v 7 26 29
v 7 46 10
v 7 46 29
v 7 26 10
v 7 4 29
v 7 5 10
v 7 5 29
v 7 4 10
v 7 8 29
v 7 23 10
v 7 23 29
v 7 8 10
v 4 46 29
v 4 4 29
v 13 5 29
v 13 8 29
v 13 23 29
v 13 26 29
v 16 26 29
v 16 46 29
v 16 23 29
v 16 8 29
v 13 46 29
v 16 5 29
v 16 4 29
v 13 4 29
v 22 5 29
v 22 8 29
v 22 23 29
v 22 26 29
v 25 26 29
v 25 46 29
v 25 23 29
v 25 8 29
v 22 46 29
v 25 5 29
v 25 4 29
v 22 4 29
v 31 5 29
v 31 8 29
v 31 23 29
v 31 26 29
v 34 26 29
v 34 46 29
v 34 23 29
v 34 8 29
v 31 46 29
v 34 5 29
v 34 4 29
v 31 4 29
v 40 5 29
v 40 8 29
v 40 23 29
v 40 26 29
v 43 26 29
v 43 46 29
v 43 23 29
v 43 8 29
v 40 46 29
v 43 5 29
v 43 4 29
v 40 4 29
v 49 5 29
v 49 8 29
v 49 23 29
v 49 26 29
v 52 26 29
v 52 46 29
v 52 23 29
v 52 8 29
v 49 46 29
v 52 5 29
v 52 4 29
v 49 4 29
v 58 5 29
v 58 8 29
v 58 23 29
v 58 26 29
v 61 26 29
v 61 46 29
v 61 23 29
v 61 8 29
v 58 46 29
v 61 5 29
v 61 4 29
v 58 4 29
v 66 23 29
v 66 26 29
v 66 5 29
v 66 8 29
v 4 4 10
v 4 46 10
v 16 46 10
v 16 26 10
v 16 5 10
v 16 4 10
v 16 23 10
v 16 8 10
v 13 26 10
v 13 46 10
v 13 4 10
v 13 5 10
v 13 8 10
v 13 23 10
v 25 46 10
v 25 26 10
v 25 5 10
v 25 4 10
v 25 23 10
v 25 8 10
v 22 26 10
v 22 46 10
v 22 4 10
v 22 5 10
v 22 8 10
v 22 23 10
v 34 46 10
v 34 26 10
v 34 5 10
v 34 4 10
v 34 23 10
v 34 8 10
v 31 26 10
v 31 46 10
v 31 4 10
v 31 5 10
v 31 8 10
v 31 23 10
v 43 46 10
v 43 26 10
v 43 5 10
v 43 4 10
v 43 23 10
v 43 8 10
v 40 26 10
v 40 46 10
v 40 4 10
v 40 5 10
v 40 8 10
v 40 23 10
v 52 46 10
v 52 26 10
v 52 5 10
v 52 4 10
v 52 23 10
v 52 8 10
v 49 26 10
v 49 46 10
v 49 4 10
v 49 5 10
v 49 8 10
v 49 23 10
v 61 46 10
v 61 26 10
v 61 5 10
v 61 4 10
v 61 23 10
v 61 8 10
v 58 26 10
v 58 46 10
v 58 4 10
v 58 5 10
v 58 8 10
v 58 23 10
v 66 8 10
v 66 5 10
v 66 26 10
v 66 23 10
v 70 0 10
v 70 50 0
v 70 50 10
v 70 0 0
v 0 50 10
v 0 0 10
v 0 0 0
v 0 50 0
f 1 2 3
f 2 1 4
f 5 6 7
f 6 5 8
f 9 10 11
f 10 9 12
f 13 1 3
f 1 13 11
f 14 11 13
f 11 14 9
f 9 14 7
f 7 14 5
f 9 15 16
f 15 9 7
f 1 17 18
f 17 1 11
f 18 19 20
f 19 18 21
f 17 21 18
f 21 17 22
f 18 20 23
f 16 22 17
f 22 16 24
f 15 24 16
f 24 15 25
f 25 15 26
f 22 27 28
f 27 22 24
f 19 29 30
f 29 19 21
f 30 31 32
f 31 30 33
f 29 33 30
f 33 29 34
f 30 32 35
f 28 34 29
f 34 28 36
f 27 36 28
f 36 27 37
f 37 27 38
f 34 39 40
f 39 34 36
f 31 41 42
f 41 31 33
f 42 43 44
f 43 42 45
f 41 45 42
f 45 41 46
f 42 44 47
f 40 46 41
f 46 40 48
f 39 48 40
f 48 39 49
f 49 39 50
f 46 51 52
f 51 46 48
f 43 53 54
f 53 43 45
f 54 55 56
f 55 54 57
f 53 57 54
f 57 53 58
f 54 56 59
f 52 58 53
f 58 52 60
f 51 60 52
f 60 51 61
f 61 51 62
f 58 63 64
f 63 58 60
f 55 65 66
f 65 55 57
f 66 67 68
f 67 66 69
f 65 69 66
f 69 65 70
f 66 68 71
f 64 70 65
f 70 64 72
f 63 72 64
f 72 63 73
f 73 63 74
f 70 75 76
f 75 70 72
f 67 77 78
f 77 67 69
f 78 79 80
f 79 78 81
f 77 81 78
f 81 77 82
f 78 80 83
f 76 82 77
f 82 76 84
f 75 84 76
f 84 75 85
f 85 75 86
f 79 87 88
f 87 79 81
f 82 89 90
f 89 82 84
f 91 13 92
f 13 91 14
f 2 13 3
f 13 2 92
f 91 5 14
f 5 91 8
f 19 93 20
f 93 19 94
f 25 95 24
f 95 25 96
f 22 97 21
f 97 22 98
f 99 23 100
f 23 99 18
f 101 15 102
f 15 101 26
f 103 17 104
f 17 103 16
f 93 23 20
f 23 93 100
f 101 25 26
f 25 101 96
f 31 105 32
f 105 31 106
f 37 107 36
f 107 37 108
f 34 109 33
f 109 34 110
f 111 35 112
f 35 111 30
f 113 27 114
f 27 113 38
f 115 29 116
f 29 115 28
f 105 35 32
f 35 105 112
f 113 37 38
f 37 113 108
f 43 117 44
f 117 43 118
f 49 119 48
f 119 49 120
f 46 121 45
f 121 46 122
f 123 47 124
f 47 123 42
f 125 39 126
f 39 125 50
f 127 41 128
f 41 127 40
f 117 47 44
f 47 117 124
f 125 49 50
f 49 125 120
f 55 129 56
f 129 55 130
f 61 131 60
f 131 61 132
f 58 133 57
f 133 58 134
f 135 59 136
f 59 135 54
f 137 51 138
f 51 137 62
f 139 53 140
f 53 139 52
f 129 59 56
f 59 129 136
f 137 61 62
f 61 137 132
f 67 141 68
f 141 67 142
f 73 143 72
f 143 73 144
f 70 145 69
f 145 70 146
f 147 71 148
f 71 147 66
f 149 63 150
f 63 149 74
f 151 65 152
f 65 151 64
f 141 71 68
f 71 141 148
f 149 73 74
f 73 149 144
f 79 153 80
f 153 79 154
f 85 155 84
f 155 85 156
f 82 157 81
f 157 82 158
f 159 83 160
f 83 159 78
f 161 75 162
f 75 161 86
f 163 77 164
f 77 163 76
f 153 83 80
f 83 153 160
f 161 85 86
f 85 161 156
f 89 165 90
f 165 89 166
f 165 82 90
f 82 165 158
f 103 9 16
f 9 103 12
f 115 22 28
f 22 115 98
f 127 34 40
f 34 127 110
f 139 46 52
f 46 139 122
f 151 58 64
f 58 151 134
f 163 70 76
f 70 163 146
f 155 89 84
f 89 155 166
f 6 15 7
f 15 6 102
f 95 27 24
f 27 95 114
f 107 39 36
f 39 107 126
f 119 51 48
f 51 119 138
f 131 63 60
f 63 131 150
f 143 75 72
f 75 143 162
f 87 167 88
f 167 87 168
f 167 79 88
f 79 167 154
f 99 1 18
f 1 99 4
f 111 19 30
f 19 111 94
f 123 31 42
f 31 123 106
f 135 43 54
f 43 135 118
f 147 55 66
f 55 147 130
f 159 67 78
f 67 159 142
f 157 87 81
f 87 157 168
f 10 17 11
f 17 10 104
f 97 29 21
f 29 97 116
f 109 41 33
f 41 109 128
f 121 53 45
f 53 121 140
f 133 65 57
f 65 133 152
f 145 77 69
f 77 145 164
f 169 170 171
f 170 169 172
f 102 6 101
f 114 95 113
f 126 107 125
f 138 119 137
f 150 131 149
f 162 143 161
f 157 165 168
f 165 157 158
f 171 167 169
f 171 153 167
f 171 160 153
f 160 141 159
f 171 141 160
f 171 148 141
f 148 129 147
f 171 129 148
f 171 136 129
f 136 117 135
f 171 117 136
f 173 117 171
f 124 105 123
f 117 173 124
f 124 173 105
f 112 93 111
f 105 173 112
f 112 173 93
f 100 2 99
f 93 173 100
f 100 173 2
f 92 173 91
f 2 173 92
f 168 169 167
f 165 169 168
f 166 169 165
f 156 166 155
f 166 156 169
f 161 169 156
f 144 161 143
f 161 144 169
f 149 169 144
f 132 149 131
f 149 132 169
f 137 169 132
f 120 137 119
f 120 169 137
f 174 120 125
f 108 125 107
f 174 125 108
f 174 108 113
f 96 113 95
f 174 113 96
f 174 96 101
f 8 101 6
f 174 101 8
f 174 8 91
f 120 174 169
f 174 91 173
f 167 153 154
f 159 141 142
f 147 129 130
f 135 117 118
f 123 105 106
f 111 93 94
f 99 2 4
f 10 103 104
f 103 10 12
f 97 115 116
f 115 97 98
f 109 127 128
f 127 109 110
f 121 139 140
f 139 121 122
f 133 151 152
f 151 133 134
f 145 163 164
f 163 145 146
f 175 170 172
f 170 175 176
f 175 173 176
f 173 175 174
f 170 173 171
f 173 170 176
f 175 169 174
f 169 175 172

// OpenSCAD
$fn = 32;

// ----------------------------------------------------------------------
// Heatsink: cross fin block
// ----------------------------------------------------------------------

// --- parameters (mm) ---
base_l = 70;              // base length, X
base_w = 50;              // base width, Y
base_t = 10;              // base plate thickness
fin_h = 20;               // fin height above the base
fin_t = 3;                // fin thickness
edge = 4;                 // margin from the base ends
pitch = 9;                // fin pitch
rib_pitch = 18;           // cross rib pitch

n_fins = floor((base_l - 2 * edge - fin_t) / pitch) + 1;  // fin count
total_h = base_t + fin_h - 1;  // overall height
n_ribs = floor((base_w - 2 * edge) / rib_pitch);  // rib count

union() {
  cube([base_l, base_w, base_t]);
  for (i = [0 : n_fins - 1])
    translate([edge + i * pitch, edge, base_t - 1])
      cube([fin_t, base_w - 2 * edge, fin_h]);
  for (i = [0 : n_ribs - 1])
    translate([edge, edge + 1 + i * rib_pitch, base_t - 1])
      cube([base_l - 2 * edge, fin_t, fin_h]);
}
